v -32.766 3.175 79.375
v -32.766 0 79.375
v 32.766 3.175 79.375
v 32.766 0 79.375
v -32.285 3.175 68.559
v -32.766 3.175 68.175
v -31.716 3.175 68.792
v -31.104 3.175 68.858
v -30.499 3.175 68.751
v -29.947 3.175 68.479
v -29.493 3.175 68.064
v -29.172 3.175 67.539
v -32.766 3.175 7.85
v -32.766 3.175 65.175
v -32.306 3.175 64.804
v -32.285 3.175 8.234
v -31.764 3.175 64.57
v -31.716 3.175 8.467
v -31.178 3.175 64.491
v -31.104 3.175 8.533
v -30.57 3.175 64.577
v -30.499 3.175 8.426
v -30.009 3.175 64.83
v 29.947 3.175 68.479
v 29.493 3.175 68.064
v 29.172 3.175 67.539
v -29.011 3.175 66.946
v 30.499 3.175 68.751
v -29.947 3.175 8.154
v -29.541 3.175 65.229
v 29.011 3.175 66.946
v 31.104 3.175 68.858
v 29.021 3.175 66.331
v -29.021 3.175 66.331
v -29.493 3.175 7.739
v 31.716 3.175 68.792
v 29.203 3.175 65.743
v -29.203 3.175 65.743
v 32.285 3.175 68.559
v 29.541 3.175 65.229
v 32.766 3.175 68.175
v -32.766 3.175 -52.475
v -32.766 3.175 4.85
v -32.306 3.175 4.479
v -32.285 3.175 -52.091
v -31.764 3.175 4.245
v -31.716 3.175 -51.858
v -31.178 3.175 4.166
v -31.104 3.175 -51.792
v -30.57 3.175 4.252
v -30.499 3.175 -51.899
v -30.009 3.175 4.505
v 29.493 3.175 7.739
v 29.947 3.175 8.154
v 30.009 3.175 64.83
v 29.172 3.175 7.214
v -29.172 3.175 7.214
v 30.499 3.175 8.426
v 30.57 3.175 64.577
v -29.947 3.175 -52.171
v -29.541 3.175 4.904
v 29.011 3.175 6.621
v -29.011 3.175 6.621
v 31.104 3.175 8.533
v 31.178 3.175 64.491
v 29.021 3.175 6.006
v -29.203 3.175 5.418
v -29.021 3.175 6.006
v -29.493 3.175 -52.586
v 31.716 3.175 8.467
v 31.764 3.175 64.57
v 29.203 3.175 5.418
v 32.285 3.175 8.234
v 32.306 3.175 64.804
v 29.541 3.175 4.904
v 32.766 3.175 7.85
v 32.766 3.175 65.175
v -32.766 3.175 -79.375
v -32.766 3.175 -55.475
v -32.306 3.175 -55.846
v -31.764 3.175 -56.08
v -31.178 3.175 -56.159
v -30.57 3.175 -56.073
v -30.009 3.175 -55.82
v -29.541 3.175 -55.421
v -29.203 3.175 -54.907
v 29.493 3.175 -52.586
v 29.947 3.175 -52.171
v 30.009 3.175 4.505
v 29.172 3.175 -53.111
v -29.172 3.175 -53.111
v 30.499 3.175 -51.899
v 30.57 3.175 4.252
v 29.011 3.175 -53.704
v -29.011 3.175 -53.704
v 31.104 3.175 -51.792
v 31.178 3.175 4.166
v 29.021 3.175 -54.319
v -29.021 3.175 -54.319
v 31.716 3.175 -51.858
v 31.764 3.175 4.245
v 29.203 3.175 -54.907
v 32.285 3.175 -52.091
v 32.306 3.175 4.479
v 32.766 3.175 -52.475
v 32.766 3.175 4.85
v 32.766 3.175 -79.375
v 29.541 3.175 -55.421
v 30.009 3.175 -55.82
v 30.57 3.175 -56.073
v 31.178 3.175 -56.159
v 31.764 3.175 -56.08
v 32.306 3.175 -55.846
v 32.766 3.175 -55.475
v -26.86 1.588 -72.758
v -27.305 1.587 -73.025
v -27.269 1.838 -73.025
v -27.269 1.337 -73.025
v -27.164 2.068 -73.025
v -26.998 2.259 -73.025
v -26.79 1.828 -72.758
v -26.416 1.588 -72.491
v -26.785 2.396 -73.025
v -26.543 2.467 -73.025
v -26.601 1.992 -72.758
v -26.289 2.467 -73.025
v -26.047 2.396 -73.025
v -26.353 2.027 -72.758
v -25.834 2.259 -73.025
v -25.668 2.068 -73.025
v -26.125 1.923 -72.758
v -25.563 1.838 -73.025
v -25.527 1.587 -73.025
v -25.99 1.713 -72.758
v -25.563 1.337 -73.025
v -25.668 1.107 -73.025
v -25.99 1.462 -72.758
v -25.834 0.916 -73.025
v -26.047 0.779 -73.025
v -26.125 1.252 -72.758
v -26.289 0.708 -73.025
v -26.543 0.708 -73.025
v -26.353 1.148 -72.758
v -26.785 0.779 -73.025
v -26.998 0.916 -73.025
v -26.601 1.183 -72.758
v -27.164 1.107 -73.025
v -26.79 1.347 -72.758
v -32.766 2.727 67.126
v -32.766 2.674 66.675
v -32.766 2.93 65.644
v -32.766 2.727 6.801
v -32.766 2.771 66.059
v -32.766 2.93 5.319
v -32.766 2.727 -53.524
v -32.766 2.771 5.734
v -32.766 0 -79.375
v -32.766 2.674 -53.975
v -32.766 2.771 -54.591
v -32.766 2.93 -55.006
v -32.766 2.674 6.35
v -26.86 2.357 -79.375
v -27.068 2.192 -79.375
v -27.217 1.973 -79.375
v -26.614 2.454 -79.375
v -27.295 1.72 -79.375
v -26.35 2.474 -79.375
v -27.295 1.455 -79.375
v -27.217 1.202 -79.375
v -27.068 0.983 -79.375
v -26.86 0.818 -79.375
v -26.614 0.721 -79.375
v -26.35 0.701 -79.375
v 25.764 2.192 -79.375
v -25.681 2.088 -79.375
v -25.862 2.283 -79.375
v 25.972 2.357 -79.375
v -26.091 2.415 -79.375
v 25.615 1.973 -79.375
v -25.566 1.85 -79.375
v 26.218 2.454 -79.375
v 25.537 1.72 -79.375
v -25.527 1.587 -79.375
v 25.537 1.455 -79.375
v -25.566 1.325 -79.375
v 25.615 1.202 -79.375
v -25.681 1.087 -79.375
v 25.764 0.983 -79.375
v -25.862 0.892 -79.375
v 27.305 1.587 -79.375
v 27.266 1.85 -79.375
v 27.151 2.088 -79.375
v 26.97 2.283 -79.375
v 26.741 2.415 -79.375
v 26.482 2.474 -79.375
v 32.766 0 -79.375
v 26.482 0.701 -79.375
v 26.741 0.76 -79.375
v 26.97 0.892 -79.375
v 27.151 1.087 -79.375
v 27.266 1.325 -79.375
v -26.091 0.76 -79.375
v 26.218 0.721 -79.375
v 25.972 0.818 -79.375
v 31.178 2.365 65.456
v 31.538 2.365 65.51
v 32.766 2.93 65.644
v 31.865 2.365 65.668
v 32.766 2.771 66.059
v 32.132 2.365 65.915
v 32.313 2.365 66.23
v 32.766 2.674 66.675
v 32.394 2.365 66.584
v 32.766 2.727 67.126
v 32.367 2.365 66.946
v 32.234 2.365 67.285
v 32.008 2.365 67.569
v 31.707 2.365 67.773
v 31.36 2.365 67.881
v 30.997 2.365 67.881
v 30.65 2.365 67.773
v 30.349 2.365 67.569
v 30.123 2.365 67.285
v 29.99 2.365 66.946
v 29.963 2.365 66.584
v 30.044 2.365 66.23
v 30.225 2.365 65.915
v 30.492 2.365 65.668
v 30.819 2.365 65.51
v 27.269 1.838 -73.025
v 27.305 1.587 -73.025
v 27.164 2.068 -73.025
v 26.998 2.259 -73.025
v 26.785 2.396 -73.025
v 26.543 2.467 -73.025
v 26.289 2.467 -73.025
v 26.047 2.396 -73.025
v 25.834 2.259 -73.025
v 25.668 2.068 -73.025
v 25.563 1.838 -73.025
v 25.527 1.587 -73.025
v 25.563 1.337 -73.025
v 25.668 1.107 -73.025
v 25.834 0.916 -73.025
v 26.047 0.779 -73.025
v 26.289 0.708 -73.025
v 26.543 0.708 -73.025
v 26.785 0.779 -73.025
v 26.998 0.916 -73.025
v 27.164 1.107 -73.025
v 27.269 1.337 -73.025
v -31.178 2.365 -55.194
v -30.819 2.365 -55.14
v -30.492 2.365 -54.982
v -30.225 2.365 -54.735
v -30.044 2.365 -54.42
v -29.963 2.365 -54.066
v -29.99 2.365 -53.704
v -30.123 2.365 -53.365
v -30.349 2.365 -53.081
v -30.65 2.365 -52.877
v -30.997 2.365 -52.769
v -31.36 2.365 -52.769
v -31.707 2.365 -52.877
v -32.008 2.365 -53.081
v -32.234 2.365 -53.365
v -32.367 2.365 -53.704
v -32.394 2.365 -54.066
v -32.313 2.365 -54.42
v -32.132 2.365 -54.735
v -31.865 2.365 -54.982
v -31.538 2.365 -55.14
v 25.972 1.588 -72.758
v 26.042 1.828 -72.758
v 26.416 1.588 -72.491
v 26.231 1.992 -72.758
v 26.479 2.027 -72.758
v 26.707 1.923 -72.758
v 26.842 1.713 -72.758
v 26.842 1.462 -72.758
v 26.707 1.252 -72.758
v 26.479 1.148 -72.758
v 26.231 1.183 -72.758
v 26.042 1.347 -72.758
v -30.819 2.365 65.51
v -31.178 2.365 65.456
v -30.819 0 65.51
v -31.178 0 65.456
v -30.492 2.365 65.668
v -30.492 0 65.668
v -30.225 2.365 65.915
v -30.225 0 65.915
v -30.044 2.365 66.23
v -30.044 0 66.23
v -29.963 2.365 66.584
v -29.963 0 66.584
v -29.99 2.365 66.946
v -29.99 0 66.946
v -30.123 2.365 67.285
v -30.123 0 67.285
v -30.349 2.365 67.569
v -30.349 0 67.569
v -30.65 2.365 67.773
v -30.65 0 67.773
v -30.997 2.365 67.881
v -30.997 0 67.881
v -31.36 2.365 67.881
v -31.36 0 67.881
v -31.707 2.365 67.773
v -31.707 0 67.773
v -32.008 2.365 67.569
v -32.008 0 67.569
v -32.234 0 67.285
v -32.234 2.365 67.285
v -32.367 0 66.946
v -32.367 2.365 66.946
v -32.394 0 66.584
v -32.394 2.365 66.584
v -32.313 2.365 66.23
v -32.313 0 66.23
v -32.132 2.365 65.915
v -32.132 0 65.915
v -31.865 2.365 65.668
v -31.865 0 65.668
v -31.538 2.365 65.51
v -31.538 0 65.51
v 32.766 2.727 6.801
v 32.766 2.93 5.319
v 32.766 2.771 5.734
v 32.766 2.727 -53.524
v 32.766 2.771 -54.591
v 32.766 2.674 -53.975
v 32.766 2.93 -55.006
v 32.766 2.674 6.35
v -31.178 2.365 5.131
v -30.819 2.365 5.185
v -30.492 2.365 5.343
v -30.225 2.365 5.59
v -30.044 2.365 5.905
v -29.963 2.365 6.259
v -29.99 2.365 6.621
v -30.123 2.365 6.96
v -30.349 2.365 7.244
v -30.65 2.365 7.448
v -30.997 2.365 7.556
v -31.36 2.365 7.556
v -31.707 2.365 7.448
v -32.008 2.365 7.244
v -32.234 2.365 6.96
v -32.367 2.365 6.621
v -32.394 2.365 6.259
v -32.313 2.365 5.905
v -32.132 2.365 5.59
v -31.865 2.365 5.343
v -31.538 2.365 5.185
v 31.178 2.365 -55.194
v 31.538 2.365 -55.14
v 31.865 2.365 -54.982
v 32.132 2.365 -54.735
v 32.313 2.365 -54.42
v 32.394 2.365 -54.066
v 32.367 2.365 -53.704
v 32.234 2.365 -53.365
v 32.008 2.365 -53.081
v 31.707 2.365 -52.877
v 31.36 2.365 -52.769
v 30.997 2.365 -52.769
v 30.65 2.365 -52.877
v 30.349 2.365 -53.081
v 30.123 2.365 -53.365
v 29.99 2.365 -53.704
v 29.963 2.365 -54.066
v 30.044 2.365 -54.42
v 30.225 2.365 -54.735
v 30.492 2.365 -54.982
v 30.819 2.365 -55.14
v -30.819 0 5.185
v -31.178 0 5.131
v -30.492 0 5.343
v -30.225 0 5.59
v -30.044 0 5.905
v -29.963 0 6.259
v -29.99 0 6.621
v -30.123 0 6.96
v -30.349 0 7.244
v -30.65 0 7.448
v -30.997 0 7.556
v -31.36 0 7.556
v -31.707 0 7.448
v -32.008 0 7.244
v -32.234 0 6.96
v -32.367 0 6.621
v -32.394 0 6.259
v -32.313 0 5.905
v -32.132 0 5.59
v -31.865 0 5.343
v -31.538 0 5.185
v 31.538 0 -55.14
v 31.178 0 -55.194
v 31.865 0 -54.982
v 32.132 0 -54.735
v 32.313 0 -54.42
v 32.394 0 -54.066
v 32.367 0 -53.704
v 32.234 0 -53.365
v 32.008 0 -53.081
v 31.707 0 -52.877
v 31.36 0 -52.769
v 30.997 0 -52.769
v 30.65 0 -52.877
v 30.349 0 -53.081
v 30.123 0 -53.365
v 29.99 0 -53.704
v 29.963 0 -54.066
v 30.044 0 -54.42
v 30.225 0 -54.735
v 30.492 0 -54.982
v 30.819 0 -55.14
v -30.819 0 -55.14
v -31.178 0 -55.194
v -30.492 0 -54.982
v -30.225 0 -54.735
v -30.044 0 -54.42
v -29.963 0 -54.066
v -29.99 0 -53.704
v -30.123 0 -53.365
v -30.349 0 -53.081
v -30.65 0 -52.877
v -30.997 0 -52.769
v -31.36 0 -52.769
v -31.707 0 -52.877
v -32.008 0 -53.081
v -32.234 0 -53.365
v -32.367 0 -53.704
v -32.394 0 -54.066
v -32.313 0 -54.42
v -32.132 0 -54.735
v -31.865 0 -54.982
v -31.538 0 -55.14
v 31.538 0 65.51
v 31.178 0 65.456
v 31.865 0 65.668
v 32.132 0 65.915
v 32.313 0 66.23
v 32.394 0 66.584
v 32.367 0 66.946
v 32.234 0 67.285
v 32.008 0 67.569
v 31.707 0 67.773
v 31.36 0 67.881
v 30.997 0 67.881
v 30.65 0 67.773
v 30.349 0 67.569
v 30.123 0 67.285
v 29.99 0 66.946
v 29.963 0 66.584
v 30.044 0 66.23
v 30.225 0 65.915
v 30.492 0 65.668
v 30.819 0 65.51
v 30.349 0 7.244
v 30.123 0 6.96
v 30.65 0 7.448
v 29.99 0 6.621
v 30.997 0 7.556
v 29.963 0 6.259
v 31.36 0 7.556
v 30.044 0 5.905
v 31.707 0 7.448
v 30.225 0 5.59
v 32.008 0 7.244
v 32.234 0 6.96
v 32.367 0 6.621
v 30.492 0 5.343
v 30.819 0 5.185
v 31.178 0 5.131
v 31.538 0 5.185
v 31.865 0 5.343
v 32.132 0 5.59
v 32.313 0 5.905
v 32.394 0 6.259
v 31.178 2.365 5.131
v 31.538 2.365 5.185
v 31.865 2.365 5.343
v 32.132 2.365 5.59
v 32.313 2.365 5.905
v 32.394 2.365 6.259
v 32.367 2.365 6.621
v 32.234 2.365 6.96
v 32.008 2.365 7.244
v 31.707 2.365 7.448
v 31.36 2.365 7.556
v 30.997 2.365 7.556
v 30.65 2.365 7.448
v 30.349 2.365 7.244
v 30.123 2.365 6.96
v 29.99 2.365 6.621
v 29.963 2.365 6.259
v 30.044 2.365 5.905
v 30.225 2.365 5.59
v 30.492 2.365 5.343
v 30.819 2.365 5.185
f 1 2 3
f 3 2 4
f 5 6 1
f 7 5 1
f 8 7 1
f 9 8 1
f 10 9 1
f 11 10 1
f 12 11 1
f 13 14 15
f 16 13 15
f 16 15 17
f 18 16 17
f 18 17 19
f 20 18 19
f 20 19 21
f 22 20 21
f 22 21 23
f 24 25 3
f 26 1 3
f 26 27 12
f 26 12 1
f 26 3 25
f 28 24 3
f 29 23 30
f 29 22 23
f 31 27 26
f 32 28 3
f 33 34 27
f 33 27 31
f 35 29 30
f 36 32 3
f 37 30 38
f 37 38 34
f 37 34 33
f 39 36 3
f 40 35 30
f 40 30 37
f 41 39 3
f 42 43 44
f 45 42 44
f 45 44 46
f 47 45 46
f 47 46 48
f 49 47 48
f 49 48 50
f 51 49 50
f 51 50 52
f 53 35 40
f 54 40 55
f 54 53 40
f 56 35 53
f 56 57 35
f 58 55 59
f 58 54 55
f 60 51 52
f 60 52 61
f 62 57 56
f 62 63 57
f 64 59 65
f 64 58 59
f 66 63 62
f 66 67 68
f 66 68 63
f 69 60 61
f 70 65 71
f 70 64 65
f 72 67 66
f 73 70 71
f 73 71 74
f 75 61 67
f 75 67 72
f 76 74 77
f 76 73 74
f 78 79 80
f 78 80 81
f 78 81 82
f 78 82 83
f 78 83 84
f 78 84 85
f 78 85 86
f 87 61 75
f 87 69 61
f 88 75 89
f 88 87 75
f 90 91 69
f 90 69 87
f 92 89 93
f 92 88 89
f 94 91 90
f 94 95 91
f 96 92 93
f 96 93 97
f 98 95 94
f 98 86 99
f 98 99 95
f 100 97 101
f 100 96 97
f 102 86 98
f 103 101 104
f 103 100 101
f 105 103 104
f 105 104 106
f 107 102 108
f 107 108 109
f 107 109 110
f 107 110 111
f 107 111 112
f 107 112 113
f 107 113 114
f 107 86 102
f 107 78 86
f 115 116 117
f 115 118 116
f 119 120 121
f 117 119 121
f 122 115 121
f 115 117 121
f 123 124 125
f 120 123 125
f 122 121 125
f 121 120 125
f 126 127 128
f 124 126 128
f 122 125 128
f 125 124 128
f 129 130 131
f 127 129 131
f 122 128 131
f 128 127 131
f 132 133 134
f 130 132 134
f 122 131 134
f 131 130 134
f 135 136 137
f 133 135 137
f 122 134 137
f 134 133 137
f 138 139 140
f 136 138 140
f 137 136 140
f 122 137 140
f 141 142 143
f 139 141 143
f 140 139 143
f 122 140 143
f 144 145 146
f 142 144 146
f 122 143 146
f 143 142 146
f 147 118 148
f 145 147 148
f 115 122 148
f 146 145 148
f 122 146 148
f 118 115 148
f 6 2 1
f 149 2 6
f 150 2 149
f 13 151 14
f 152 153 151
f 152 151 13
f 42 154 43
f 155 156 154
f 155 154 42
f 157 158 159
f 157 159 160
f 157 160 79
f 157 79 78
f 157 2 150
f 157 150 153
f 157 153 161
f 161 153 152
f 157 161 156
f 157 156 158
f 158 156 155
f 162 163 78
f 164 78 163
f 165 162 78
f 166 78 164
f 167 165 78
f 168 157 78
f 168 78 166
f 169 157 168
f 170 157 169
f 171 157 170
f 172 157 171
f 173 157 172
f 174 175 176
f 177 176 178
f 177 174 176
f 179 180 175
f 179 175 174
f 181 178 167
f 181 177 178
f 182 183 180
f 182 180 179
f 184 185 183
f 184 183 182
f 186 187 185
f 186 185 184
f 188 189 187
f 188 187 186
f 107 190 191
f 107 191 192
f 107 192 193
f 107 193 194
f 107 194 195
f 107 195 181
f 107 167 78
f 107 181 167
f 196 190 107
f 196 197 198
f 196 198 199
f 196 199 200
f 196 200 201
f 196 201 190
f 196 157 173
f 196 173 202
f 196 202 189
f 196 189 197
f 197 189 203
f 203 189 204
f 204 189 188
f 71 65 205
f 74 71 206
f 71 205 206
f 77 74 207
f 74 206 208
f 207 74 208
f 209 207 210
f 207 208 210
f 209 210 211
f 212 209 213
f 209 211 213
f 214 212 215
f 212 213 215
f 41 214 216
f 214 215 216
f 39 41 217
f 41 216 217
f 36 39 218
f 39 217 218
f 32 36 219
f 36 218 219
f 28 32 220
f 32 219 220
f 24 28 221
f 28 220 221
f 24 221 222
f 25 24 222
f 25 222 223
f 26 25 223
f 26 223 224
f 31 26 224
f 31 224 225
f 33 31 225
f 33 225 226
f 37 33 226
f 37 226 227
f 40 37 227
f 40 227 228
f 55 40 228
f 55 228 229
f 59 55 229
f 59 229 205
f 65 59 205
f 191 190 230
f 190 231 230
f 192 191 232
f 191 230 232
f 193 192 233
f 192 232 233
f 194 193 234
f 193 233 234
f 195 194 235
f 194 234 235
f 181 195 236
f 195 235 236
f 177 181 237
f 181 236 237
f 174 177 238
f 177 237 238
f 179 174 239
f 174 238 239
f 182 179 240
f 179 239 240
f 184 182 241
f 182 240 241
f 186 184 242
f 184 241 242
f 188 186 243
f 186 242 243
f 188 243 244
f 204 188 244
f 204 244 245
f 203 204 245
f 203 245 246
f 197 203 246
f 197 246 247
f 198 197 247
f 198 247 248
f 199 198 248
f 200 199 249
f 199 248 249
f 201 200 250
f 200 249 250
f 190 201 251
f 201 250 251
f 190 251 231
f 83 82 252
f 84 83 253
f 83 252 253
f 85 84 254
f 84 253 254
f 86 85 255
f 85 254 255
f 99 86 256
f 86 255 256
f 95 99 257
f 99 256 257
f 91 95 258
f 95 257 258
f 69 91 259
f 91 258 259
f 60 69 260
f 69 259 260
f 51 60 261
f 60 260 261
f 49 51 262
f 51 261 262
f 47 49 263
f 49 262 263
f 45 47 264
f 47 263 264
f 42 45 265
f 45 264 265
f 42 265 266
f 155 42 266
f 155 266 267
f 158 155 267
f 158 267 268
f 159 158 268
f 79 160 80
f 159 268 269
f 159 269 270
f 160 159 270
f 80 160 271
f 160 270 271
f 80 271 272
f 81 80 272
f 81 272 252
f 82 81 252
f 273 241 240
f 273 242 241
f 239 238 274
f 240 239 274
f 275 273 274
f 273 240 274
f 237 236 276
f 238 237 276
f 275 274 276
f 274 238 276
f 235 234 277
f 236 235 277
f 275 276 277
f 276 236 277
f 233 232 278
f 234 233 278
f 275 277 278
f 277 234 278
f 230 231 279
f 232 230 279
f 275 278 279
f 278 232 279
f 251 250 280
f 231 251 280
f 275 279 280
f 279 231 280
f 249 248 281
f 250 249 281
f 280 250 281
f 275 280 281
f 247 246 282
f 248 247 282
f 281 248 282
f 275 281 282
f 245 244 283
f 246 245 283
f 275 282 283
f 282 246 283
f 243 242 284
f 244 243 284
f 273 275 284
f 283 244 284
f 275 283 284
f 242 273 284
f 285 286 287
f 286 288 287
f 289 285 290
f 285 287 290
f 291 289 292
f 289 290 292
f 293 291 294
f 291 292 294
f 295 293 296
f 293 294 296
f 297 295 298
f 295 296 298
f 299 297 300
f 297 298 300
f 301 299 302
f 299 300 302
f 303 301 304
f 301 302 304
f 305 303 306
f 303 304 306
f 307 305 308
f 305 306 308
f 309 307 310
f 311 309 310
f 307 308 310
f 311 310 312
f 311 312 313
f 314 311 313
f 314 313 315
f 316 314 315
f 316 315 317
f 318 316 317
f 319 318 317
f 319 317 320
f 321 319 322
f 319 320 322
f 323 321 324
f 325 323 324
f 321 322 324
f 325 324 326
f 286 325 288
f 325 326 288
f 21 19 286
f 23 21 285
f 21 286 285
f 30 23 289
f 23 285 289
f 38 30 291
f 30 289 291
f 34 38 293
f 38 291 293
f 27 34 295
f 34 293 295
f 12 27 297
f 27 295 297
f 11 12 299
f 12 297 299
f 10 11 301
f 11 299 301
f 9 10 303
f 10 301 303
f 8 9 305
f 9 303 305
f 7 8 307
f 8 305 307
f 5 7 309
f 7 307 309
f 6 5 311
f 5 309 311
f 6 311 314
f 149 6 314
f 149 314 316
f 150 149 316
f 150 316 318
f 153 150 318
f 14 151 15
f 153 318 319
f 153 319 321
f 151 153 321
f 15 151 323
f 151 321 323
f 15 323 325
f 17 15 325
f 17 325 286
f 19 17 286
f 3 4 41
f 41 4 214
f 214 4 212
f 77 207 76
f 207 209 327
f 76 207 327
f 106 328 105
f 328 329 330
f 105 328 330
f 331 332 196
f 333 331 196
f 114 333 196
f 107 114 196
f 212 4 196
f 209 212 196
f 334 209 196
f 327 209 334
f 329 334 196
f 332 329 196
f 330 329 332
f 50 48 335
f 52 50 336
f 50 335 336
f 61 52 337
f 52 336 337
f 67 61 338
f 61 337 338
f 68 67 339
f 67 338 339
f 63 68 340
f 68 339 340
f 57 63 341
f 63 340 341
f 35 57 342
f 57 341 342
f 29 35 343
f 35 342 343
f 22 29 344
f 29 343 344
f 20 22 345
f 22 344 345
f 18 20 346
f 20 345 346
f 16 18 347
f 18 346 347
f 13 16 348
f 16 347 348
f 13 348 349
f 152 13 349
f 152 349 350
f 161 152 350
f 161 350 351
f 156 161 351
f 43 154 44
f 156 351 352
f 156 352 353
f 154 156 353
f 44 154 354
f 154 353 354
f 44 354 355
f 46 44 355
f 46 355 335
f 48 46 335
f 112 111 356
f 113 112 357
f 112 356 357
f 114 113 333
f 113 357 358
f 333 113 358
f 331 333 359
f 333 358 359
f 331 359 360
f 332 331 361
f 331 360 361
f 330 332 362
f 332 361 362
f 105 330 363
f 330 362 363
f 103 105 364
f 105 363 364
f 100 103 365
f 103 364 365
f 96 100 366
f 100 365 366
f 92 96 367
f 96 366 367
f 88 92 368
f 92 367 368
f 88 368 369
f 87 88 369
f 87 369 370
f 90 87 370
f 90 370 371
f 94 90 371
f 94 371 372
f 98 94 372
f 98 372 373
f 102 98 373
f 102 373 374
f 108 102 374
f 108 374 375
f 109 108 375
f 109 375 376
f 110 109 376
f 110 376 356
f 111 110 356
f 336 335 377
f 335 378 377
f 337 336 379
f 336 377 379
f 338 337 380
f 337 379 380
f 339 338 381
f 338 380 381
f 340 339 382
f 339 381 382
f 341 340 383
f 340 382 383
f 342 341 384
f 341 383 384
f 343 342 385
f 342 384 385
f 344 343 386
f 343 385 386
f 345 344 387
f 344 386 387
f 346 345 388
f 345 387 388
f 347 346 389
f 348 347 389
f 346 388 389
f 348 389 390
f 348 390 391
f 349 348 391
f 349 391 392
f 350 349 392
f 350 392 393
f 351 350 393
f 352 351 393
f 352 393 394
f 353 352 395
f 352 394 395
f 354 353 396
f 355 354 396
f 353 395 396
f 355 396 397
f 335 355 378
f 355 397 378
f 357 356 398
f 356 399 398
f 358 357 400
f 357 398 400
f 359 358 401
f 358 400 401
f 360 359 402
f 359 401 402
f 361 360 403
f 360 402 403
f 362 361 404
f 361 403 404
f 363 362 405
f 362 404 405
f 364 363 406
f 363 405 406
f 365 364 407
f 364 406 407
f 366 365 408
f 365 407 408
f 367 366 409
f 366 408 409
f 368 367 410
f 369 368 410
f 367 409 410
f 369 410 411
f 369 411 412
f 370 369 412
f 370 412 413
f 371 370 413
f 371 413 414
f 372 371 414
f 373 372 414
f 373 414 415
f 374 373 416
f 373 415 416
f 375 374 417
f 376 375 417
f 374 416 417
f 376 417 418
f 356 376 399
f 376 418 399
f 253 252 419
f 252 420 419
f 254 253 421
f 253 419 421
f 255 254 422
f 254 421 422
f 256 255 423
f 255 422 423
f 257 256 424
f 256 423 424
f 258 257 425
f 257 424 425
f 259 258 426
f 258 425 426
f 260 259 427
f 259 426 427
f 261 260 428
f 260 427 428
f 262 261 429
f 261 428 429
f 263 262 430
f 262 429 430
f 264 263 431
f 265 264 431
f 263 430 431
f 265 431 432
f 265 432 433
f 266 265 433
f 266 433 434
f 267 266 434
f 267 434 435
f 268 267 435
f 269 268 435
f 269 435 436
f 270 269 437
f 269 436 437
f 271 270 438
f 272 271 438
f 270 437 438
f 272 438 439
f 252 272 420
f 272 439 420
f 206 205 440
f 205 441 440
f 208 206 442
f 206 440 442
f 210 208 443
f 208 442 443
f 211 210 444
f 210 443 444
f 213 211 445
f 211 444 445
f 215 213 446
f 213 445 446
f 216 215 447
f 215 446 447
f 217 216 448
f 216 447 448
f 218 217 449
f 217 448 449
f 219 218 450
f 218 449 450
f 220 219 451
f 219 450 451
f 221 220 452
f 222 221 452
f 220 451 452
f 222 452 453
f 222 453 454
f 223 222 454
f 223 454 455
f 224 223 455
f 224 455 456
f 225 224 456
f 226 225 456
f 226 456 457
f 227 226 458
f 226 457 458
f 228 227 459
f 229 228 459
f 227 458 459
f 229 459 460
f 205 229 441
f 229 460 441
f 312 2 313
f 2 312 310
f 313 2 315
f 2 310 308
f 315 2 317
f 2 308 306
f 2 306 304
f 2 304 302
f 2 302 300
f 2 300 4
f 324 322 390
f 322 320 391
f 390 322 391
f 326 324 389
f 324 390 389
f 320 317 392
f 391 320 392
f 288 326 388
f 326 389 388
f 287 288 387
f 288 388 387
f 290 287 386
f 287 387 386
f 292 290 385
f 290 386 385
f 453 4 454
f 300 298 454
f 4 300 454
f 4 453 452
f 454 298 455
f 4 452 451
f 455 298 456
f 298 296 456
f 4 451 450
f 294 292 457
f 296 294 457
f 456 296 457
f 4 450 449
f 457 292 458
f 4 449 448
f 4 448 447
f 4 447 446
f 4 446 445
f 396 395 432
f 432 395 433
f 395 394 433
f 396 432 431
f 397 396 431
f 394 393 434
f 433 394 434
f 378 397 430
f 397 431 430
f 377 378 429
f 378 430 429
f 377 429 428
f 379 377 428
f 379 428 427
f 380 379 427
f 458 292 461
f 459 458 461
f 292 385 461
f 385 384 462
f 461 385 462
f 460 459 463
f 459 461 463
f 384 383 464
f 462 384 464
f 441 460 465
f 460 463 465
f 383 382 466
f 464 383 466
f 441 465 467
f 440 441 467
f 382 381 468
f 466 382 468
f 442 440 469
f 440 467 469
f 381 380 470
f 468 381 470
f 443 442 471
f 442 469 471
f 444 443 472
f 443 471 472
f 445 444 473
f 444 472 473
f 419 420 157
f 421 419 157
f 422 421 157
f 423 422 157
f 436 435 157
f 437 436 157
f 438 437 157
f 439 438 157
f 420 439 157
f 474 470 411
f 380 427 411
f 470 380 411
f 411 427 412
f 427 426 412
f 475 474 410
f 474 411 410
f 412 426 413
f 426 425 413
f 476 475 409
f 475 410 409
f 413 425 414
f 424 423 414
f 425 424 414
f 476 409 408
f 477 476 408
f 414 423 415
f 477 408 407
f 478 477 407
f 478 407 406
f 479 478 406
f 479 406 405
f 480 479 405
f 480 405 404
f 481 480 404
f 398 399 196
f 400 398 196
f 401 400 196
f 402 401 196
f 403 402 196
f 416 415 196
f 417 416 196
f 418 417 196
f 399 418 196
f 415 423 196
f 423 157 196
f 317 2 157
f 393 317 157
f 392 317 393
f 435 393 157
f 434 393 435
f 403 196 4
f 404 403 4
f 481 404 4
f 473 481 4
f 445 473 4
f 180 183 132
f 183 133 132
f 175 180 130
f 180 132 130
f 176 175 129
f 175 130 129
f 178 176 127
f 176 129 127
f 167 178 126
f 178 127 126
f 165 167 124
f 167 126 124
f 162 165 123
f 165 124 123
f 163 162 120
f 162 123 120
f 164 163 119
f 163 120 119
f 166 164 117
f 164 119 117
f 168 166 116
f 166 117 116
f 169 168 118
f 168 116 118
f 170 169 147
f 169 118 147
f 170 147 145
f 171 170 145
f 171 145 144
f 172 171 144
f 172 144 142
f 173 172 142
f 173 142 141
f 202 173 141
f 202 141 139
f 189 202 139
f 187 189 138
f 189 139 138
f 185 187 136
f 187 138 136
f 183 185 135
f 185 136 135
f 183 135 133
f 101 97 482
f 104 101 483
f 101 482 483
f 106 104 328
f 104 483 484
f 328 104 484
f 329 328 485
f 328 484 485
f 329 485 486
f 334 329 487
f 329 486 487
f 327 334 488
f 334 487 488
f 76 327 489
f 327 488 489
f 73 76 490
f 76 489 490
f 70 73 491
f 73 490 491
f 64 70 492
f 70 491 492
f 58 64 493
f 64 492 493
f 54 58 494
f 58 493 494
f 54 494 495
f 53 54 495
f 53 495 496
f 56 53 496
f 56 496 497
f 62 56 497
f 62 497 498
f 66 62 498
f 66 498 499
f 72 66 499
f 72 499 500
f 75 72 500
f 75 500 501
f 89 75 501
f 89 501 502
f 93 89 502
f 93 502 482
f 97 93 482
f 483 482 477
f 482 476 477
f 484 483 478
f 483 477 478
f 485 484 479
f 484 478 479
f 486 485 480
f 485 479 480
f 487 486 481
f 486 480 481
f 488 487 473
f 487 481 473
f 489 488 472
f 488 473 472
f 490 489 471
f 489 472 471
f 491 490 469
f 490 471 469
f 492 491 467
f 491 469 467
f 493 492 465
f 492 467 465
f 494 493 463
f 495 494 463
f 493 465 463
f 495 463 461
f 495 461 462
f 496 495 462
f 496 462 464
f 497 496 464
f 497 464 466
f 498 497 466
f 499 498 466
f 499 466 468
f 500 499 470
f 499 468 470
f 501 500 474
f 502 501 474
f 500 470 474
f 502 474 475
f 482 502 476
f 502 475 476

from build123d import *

# Parameters (mm, degrees)
SKETCH1_W                                         = 65.532
SKETCH1_H                                         = 158.75
EXTRUDE1_DEPTH                                    = 3.175
CSK_FOR_2_FLAT_HEAD_MACHINE_SCREW_100_D           = 2.4384
CSK_FOR_2_FLAT_HEAD_MACHINE_SCREW_100_CSINK_D     = 4.3688
CSK_FOR_2_FLAT_HEAD_MACHINE_SCREW_100_CSINK_ANGLE = 100
TAP_DRILL_FOR_2_TAP1_D                            = 1.778
TAP_DRILL_FOR_2_TAP1_DEPTH                        = 6.35
TAP_DRILL_FOR_2_TAP1_TIP                          = 0.53416509


with BuildPart() as part:
    # Sketch1 → Extrude1 (new body)
    with BuildSketch(Plane(origin=(0, 0, 0), x_dir=(1, 0, 0), z_dir=(0, 1, 0))):
        Rectangle(SKETCH1_W, SKETCH1_H)
    extrude(amount=EXTRUDE1_DEPTH)

    # CSK for #2 Flat Head Machine Screw (100)1 (through all)
    with Locations(Plane(origin=(-31.1785, 3.175, -53.975), x_dir=(0, 0, 1), z_dir=(0, 1, 0))):
        with Locations((0, 0), (120.65, 0), (60.325, 0), (0, 62.357), (60.325, 62.357), (120.65, 62.357)):
            CounterSinkHole(CSK_FOR_2_FLAT_HEAD_MACHINE_SCREW_100_D / 2, CSK_FOR_2_FLAT_HEAD_MACHINE_SCREW_100_CSINK_D / 2, counter_sink_angle=CSK_FOR_2_FLAT_HEAD_MACHINE_SCREW_100_CSINK_ANGLE)

    # Tap Drill for #2 Tap1
    with Locations(Plane(origin=(-26.416, 1.5875, -79.375), x_dir=(-1, 0, 0), z_dir=(0, 0, -1))):
        with Locations((0, 0), (-52.832, 0)):
            Hole(TAP_DRILL_FOR_2_TAP1_D / 2, depth=TAP_DRILL_FOR_2_TAP1_DEPTH)
            with Locations((0, 0, -(TAP_DRILL_FOR_2_TAP1_DEPTH + TAP_DRILL_FOR_2_TAP1_TIP / 2))):  # 118° drill point
                Cone(0, TAP_DRILL_FOR_2_TAP1_D / 2, TAP_DRILL_FOR_2_TAP1_TIP, mode=Mode.SUBTRACT)


solid = part.part
